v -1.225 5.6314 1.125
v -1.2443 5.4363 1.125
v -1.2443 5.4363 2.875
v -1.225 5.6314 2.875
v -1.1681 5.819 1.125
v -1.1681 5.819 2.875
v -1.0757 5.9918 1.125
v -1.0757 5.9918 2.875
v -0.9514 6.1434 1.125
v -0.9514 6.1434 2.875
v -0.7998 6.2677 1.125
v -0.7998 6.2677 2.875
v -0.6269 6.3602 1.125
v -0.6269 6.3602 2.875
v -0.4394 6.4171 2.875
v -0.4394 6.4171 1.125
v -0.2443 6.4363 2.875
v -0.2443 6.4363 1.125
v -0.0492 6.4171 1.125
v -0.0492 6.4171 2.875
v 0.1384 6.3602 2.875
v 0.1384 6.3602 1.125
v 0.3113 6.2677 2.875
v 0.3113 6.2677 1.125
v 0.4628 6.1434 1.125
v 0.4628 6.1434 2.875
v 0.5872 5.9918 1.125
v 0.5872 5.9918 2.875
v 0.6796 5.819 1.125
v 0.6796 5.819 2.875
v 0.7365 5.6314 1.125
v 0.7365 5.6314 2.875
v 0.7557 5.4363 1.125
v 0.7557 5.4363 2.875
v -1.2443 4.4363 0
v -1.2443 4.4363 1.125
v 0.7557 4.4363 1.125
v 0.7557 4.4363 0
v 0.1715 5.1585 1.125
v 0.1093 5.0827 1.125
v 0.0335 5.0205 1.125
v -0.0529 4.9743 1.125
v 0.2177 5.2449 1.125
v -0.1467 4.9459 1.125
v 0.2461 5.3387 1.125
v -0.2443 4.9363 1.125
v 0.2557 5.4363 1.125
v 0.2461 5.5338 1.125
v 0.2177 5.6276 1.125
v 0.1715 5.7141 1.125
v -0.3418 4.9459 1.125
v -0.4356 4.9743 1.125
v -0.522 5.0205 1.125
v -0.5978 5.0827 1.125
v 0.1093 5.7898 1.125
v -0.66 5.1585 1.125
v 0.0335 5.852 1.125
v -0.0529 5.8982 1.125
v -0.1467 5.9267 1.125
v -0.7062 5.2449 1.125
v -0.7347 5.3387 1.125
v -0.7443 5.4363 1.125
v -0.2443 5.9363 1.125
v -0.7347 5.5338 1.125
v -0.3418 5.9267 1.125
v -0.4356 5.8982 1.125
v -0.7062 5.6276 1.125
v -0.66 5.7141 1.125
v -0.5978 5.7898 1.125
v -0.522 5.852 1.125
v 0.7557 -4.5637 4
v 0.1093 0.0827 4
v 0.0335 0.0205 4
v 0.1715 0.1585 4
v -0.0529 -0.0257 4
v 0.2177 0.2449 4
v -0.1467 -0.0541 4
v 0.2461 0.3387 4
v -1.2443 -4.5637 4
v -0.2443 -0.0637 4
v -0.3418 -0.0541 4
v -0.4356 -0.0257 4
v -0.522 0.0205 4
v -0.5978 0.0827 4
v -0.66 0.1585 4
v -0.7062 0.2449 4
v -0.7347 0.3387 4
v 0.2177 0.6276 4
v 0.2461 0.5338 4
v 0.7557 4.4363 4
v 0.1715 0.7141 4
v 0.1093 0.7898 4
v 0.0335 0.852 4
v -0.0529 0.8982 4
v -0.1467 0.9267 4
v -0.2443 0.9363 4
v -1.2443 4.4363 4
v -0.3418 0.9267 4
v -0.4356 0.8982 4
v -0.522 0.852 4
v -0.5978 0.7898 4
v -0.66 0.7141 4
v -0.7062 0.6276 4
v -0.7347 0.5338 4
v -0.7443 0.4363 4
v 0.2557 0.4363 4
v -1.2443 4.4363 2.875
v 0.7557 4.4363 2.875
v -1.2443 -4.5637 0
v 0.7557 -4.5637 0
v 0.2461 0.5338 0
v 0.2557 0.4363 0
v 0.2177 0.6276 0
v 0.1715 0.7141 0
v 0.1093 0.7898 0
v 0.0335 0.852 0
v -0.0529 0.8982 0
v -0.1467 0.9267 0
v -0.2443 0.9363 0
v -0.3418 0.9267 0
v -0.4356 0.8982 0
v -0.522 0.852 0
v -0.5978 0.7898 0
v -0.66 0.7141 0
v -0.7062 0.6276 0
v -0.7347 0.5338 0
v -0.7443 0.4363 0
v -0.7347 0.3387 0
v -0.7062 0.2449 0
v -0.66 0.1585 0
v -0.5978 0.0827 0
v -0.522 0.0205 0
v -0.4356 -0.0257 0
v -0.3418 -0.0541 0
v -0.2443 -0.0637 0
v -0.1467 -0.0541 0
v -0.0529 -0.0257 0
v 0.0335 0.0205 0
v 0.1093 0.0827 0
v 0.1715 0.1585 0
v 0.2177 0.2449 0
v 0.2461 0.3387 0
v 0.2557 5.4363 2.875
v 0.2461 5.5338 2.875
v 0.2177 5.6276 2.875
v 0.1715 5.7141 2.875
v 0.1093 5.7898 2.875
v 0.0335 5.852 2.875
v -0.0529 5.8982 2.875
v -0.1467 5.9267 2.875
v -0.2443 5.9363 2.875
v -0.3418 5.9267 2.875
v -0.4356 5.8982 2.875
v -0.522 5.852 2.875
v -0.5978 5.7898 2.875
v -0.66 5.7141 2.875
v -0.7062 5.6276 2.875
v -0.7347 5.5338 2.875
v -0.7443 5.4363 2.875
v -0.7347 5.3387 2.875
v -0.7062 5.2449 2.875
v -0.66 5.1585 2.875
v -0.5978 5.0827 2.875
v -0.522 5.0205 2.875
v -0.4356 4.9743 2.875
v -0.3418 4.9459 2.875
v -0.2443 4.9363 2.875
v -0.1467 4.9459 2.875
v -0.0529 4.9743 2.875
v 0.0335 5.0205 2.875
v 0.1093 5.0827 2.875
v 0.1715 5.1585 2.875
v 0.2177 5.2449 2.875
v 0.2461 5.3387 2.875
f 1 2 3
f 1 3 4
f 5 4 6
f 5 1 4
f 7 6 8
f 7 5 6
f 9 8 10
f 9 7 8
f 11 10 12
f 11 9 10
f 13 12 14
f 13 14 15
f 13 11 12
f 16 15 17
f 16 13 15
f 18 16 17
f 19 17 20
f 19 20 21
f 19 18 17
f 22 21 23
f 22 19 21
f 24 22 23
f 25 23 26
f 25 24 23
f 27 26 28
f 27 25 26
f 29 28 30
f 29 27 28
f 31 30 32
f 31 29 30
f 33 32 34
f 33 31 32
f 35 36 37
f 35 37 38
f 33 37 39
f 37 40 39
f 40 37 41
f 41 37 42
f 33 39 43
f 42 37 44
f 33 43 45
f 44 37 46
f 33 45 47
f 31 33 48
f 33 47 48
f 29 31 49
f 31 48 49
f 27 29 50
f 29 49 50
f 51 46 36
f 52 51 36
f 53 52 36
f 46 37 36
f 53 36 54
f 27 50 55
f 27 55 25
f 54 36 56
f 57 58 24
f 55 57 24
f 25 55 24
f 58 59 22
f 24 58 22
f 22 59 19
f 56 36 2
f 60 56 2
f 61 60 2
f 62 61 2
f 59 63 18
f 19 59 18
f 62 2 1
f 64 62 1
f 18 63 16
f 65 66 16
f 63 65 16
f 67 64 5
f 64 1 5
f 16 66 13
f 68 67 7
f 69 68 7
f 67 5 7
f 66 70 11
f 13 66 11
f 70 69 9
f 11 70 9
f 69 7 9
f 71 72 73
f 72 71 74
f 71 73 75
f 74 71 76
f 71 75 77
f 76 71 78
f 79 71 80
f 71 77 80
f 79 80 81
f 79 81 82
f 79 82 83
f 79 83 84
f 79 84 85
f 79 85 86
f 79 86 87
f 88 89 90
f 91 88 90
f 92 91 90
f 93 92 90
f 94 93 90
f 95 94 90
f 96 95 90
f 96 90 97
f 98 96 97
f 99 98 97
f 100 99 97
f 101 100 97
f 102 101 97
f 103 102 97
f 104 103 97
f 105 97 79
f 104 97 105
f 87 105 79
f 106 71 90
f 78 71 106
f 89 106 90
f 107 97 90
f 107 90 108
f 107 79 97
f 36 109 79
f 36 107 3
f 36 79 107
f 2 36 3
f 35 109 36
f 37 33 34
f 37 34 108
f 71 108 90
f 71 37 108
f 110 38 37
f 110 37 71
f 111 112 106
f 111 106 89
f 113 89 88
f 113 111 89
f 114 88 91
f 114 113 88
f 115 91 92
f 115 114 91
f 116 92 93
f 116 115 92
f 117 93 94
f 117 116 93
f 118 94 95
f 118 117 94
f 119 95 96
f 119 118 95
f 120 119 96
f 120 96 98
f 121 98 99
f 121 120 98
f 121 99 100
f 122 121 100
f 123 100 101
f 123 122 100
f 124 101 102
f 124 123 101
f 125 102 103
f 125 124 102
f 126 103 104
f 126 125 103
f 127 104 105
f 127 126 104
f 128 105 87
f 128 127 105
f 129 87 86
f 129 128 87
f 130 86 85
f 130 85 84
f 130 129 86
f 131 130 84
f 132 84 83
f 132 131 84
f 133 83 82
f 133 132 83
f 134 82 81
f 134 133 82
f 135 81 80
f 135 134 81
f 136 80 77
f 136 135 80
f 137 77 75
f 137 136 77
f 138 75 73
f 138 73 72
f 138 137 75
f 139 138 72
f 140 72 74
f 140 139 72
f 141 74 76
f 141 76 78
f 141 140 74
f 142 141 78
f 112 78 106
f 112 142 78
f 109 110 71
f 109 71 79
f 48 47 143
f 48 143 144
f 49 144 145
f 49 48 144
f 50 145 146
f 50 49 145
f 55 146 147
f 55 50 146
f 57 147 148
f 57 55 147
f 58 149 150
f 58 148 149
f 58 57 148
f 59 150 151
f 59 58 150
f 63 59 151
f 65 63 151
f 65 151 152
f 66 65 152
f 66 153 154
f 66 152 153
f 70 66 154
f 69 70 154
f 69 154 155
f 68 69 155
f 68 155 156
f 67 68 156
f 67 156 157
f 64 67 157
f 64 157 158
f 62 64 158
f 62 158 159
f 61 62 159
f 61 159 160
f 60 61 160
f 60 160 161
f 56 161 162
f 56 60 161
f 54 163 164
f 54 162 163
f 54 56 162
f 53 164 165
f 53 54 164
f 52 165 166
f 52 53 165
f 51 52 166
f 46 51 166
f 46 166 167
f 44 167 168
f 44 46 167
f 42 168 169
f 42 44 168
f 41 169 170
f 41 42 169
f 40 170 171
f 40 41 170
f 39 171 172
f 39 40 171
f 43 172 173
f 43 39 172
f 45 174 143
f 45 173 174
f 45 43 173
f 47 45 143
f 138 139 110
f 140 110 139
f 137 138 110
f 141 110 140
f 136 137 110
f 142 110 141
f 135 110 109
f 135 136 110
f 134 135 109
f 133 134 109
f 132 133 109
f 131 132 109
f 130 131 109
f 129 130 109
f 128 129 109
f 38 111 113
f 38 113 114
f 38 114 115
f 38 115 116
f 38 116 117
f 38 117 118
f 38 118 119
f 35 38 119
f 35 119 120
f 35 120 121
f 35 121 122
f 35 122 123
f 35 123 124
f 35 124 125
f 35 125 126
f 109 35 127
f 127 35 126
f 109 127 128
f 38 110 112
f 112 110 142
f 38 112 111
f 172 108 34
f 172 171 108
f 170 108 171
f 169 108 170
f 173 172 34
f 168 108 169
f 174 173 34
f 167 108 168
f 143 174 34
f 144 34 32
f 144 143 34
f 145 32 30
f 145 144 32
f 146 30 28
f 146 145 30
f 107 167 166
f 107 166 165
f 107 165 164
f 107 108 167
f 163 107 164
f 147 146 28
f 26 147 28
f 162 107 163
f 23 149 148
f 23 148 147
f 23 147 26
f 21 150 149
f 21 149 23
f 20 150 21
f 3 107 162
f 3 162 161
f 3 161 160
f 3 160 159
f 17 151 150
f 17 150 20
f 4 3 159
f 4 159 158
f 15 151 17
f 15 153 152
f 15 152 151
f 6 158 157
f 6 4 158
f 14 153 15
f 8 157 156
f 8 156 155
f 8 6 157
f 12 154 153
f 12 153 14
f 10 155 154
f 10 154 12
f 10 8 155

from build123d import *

# Parameters (mm, degrees)
SKETCH_1_R               = 0.5
EXTRUDE_1_DEPTH          = 4
CUT_EXTRUDE_2_DEPTH      = 8.679442038
CUT_EXTRUDE_2_DEPTH_BACK = 8.679442038
SKETCH_2_W               = 1.125
SKETCH_2_H               = 2


with BuildPart() as part:
    # 草图1 → 凸台-拉伸1 (new body)
    with BuildSketch(Plane.XY):
        with BuildLine():
            Line((-1.244261308, -4.563724383), (-1.244261308, 5.436275617))
            ThreePointArc((-1.244261308, 5.436275617), (-0.244261308, 6.436275617), (0.755738692, 5.436275617))
            Line((0.755738692, 5.436275617), (0.755738692, -4.563724383))
            Line((0.755738692, -4.563724383), (-1.244261308, -4.563724383))
        make_face()
        with Locations((-0.244261308, 5.436275617)):
            Circle(SKETCH_1_R, mode=Mode.SUBTRACT)
        with Locations((-0.244261308, 0.436275617)):
            Circle(SKETCH_1_R, mode=Mode.SUBTRACT)
    extrude(amount=EXTRUDE_1_DEPTH)

    # 草图2 → 切除-拉伸2 (cut, two sides: drawn at the far end of the back side and taken through both)
    with BuildSketch(Plane(origin=(0, 0, 0), x_dir=(0, 0, -1), z_dir=(1, 0, 0)).offset(-CUT_EXTRUDE_2_DEPTH_BACK)):
        with Locations((-3.4375, 5.436275617)):
            Rectangle(SKETCH_2_W, SKETCH_2_H)
        with Locations((-0.5625, 5.436275617)):
            Rectangle(SKETCH_2_W, SKETCH_2_H)
    extrude(amount=CUT_EXTRUDE_2_DEPTH + CUT_EXTRUDE_2_DEPTH_BACK, mode=Mode.SUBTRACT)


solid = part.part
